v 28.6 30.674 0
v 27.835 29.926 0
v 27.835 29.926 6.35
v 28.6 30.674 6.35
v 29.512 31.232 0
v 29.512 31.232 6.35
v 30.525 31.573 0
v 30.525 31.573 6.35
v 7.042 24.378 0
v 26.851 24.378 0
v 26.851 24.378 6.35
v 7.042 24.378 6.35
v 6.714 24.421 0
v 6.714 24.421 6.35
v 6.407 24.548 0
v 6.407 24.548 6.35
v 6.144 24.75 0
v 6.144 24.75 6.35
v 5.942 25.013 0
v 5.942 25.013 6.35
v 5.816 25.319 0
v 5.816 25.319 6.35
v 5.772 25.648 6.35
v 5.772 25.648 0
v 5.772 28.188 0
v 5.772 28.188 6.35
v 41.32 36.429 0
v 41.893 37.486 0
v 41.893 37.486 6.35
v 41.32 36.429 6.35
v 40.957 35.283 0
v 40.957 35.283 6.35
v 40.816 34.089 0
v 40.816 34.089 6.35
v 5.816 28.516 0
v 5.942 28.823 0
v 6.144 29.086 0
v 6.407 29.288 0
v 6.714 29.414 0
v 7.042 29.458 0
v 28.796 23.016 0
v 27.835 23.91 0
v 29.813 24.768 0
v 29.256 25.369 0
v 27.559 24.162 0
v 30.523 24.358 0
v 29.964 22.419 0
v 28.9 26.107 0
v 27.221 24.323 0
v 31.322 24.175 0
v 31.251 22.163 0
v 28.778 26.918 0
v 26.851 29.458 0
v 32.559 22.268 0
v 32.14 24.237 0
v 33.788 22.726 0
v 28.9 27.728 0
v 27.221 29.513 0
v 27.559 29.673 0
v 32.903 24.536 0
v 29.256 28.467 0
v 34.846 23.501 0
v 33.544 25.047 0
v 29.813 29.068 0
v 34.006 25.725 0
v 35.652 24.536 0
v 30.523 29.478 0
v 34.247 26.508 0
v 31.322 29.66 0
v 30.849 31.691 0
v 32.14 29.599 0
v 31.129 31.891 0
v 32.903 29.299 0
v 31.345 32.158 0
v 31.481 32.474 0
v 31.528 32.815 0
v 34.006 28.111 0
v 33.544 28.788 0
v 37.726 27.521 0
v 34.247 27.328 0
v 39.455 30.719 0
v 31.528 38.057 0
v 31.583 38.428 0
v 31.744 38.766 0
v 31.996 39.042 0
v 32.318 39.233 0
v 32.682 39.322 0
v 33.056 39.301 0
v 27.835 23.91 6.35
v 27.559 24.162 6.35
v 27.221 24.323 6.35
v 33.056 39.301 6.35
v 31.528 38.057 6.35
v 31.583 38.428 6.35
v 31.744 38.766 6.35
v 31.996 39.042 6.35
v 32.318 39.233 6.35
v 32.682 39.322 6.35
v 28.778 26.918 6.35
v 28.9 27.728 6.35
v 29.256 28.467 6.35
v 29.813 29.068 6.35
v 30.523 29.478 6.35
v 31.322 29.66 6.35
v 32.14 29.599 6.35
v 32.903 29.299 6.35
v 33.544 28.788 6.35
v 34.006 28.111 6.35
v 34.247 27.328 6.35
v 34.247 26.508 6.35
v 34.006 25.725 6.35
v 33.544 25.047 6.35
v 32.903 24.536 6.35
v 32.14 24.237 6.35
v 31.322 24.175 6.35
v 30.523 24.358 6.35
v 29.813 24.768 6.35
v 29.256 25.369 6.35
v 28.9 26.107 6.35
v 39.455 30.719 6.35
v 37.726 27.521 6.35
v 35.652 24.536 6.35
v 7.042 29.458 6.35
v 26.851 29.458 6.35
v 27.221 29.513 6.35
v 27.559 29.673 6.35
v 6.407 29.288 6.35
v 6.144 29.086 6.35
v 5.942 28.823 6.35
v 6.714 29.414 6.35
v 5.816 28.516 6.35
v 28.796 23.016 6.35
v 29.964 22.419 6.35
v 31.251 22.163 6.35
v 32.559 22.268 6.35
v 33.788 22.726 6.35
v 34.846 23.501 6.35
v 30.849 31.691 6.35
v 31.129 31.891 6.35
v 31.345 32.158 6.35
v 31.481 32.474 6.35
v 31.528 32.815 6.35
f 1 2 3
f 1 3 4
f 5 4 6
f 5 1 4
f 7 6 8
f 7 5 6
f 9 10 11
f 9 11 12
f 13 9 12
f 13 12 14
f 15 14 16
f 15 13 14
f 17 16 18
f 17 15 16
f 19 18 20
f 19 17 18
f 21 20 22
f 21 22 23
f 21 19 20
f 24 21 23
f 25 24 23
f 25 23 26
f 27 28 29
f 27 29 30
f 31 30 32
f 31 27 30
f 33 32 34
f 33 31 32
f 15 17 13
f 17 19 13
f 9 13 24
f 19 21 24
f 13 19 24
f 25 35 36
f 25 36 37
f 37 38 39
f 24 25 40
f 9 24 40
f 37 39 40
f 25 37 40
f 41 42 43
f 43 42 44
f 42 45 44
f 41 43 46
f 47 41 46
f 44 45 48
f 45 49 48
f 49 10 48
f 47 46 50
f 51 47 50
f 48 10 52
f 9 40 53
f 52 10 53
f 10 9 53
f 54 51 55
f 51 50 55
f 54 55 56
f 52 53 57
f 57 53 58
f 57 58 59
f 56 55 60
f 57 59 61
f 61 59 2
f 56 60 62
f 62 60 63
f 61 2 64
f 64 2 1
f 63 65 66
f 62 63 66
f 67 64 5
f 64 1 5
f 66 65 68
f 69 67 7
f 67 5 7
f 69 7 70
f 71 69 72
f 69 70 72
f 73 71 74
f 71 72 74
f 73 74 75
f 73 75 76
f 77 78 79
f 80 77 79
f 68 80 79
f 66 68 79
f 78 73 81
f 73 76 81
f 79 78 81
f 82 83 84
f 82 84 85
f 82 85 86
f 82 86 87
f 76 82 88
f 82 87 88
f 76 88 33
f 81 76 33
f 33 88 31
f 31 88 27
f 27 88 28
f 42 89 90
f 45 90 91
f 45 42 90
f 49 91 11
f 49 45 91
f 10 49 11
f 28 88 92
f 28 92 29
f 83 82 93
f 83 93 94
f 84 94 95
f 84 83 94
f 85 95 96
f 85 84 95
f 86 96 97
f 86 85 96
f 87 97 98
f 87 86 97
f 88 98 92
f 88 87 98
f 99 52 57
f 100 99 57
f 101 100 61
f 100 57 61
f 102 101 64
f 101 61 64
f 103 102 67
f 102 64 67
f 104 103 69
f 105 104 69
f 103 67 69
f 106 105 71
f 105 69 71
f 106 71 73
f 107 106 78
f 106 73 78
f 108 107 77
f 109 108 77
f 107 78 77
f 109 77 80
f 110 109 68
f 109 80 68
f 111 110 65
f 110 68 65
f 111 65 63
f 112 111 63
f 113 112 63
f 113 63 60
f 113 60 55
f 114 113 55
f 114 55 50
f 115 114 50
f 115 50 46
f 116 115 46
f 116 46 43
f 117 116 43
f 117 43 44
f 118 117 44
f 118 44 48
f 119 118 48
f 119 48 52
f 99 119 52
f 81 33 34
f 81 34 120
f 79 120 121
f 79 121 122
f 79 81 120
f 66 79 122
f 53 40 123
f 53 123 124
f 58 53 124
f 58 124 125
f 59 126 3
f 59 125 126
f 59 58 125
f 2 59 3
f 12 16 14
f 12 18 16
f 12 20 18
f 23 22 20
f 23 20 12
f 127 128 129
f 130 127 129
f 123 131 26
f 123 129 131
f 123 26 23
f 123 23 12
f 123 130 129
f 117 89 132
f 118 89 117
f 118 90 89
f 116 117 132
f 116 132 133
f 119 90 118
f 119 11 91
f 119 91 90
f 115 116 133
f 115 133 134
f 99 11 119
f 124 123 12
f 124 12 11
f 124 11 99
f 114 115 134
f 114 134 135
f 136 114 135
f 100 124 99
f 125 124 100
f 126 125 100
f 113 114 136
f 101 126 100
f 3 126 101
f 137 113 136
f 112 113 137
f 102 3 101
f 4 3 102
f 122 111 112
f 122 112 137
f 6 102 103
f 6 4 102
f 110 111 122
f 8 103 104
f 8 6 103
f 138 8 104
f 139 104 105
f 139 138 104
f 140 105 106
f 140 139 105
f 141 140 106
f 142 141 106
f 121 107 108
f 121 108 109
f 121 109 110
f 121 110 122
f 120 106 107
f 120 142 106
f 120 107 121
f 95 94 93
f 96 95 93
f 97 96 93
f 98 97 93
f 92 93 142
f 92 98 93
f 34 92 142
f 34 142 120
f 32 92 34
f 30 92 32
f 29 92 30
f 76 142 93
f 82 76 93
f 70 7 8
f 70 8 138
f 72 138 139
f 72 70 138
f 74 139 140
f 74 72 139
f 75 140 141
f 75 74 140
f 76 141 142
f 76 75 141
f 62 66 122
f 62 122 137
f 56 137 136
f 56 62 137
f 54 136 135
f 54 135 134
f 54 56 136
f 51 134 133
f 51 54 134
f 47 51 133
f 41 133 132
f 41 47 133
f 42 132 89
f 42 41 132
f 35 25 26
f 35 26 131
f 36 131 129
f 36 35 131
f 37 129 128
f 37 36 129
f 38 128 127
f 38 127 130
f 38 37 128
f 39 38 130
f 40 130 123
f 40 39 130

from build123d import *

# Parameters (mm, degrees)
SKETCH1_W           = 50
SKETCH1_H           = 50
BOSS_EXTRUDE1_DEPTH = 6.35
SKETCH2_OUTSIDE_W   = 66.2
SKETCH2_OUTSIDE_H   = 66.2
SKETCH2_OUTSIDE_R   = 2.75
CUT_EXTRUDE1_DEPTH  = 7.35


with BuildPart() as part:
    # Sketch1 → Boss-Extrude1 (new body)
    with BuildSketch(Plane.XY):
        with Locations((25, 25)):
            Rectangle(SKETCH1_W, SKETCH1_H)
    extrude(amount=BOSS_EXTRUDE1_DEPTH)

    # Sketch2 outside → Cut-Extrude1 (cut, through all)
    with BuildSketch(Plane(origin=(0, 0, 0), x_dir=(-1, 0, 0), z_dir=(0, 0, -1))):
        with Locations((-25, 25)):
            Rectangle(SKETCH2_OUTSIDE_W, SKETCH2_OUTSIDE_H)
        with BuildLine():
            Line((-26.850834583, 24.37770606), (-7.04230164, 24.37770606))
            ThreePointArc((-7.04230164, 24.37770606), (-6.144276028, 24.749680448), (-5.77230164, 25.64770606))
            Line((-5.77230164, 25.64770606), (-5.77230164, 28.18770606))
            ThreePointArc((-5.77230164, 28.18770606), (-6.144276028, 29.085731672), (-7.04230164, 29.45770606))
            Line((-7.04230164, 29.45770606), (-26.850834583, 29.45770606))
            ThreePointArc((-26.850834583, 29.45770606), (-27.395915456, 29.580628538), (-27.835480279, 29.925600797))
            ThreePointArc((-27.835480279, 29.925600797), (-29.039981102, 30.97869826), (-30.525270061, 31.573469818))
            ThreePointArc((-30.525270061, 31.573469818), (-31.245944628, 32.017090124), (-31.52790164, 32.81500682))
            Line((-31.52790164, 32.81500682), (-31.52790164, 38.057404626))
            ThreePointArc((-31.52790164, 38.057404626), (-31.996191822, 39.042372325), (-33.055714819, 39.300960963))
            Line((-33.055714819, 39.300960963), (-41.893380205, 37.485936348))
            ThreePointArc((-41.893380205, 37.485936348), (-41.111586239, 35.864517894), (-40.816192235, 34.08886534))
            ThreePointArc((-40.816192235, 34.08886534), (-38.634961437, 29.096054751), (-35.652347625, 24.53645606))
            ThreePointArc((-35.652347625, 24.53645606), (-31.908469933, 22.170435895), (-27.835480279, 23.909811323))
            ThreePointArc((-27.835480279, 23.909811323), (-27.395915456, 24.254783582), (-26.850834583, 24.37770606))
        make_face(mode=Mode.SUBTRACT)
        with Locations((-31.52790164, 26.91770606)):
            Circle(SKETCH2_OUTSIDE_R)
    extrude(amount=-CUT_EXTRUDE1_DEPTH, mode=Mode.SUBTRACT)


solid = part.part
